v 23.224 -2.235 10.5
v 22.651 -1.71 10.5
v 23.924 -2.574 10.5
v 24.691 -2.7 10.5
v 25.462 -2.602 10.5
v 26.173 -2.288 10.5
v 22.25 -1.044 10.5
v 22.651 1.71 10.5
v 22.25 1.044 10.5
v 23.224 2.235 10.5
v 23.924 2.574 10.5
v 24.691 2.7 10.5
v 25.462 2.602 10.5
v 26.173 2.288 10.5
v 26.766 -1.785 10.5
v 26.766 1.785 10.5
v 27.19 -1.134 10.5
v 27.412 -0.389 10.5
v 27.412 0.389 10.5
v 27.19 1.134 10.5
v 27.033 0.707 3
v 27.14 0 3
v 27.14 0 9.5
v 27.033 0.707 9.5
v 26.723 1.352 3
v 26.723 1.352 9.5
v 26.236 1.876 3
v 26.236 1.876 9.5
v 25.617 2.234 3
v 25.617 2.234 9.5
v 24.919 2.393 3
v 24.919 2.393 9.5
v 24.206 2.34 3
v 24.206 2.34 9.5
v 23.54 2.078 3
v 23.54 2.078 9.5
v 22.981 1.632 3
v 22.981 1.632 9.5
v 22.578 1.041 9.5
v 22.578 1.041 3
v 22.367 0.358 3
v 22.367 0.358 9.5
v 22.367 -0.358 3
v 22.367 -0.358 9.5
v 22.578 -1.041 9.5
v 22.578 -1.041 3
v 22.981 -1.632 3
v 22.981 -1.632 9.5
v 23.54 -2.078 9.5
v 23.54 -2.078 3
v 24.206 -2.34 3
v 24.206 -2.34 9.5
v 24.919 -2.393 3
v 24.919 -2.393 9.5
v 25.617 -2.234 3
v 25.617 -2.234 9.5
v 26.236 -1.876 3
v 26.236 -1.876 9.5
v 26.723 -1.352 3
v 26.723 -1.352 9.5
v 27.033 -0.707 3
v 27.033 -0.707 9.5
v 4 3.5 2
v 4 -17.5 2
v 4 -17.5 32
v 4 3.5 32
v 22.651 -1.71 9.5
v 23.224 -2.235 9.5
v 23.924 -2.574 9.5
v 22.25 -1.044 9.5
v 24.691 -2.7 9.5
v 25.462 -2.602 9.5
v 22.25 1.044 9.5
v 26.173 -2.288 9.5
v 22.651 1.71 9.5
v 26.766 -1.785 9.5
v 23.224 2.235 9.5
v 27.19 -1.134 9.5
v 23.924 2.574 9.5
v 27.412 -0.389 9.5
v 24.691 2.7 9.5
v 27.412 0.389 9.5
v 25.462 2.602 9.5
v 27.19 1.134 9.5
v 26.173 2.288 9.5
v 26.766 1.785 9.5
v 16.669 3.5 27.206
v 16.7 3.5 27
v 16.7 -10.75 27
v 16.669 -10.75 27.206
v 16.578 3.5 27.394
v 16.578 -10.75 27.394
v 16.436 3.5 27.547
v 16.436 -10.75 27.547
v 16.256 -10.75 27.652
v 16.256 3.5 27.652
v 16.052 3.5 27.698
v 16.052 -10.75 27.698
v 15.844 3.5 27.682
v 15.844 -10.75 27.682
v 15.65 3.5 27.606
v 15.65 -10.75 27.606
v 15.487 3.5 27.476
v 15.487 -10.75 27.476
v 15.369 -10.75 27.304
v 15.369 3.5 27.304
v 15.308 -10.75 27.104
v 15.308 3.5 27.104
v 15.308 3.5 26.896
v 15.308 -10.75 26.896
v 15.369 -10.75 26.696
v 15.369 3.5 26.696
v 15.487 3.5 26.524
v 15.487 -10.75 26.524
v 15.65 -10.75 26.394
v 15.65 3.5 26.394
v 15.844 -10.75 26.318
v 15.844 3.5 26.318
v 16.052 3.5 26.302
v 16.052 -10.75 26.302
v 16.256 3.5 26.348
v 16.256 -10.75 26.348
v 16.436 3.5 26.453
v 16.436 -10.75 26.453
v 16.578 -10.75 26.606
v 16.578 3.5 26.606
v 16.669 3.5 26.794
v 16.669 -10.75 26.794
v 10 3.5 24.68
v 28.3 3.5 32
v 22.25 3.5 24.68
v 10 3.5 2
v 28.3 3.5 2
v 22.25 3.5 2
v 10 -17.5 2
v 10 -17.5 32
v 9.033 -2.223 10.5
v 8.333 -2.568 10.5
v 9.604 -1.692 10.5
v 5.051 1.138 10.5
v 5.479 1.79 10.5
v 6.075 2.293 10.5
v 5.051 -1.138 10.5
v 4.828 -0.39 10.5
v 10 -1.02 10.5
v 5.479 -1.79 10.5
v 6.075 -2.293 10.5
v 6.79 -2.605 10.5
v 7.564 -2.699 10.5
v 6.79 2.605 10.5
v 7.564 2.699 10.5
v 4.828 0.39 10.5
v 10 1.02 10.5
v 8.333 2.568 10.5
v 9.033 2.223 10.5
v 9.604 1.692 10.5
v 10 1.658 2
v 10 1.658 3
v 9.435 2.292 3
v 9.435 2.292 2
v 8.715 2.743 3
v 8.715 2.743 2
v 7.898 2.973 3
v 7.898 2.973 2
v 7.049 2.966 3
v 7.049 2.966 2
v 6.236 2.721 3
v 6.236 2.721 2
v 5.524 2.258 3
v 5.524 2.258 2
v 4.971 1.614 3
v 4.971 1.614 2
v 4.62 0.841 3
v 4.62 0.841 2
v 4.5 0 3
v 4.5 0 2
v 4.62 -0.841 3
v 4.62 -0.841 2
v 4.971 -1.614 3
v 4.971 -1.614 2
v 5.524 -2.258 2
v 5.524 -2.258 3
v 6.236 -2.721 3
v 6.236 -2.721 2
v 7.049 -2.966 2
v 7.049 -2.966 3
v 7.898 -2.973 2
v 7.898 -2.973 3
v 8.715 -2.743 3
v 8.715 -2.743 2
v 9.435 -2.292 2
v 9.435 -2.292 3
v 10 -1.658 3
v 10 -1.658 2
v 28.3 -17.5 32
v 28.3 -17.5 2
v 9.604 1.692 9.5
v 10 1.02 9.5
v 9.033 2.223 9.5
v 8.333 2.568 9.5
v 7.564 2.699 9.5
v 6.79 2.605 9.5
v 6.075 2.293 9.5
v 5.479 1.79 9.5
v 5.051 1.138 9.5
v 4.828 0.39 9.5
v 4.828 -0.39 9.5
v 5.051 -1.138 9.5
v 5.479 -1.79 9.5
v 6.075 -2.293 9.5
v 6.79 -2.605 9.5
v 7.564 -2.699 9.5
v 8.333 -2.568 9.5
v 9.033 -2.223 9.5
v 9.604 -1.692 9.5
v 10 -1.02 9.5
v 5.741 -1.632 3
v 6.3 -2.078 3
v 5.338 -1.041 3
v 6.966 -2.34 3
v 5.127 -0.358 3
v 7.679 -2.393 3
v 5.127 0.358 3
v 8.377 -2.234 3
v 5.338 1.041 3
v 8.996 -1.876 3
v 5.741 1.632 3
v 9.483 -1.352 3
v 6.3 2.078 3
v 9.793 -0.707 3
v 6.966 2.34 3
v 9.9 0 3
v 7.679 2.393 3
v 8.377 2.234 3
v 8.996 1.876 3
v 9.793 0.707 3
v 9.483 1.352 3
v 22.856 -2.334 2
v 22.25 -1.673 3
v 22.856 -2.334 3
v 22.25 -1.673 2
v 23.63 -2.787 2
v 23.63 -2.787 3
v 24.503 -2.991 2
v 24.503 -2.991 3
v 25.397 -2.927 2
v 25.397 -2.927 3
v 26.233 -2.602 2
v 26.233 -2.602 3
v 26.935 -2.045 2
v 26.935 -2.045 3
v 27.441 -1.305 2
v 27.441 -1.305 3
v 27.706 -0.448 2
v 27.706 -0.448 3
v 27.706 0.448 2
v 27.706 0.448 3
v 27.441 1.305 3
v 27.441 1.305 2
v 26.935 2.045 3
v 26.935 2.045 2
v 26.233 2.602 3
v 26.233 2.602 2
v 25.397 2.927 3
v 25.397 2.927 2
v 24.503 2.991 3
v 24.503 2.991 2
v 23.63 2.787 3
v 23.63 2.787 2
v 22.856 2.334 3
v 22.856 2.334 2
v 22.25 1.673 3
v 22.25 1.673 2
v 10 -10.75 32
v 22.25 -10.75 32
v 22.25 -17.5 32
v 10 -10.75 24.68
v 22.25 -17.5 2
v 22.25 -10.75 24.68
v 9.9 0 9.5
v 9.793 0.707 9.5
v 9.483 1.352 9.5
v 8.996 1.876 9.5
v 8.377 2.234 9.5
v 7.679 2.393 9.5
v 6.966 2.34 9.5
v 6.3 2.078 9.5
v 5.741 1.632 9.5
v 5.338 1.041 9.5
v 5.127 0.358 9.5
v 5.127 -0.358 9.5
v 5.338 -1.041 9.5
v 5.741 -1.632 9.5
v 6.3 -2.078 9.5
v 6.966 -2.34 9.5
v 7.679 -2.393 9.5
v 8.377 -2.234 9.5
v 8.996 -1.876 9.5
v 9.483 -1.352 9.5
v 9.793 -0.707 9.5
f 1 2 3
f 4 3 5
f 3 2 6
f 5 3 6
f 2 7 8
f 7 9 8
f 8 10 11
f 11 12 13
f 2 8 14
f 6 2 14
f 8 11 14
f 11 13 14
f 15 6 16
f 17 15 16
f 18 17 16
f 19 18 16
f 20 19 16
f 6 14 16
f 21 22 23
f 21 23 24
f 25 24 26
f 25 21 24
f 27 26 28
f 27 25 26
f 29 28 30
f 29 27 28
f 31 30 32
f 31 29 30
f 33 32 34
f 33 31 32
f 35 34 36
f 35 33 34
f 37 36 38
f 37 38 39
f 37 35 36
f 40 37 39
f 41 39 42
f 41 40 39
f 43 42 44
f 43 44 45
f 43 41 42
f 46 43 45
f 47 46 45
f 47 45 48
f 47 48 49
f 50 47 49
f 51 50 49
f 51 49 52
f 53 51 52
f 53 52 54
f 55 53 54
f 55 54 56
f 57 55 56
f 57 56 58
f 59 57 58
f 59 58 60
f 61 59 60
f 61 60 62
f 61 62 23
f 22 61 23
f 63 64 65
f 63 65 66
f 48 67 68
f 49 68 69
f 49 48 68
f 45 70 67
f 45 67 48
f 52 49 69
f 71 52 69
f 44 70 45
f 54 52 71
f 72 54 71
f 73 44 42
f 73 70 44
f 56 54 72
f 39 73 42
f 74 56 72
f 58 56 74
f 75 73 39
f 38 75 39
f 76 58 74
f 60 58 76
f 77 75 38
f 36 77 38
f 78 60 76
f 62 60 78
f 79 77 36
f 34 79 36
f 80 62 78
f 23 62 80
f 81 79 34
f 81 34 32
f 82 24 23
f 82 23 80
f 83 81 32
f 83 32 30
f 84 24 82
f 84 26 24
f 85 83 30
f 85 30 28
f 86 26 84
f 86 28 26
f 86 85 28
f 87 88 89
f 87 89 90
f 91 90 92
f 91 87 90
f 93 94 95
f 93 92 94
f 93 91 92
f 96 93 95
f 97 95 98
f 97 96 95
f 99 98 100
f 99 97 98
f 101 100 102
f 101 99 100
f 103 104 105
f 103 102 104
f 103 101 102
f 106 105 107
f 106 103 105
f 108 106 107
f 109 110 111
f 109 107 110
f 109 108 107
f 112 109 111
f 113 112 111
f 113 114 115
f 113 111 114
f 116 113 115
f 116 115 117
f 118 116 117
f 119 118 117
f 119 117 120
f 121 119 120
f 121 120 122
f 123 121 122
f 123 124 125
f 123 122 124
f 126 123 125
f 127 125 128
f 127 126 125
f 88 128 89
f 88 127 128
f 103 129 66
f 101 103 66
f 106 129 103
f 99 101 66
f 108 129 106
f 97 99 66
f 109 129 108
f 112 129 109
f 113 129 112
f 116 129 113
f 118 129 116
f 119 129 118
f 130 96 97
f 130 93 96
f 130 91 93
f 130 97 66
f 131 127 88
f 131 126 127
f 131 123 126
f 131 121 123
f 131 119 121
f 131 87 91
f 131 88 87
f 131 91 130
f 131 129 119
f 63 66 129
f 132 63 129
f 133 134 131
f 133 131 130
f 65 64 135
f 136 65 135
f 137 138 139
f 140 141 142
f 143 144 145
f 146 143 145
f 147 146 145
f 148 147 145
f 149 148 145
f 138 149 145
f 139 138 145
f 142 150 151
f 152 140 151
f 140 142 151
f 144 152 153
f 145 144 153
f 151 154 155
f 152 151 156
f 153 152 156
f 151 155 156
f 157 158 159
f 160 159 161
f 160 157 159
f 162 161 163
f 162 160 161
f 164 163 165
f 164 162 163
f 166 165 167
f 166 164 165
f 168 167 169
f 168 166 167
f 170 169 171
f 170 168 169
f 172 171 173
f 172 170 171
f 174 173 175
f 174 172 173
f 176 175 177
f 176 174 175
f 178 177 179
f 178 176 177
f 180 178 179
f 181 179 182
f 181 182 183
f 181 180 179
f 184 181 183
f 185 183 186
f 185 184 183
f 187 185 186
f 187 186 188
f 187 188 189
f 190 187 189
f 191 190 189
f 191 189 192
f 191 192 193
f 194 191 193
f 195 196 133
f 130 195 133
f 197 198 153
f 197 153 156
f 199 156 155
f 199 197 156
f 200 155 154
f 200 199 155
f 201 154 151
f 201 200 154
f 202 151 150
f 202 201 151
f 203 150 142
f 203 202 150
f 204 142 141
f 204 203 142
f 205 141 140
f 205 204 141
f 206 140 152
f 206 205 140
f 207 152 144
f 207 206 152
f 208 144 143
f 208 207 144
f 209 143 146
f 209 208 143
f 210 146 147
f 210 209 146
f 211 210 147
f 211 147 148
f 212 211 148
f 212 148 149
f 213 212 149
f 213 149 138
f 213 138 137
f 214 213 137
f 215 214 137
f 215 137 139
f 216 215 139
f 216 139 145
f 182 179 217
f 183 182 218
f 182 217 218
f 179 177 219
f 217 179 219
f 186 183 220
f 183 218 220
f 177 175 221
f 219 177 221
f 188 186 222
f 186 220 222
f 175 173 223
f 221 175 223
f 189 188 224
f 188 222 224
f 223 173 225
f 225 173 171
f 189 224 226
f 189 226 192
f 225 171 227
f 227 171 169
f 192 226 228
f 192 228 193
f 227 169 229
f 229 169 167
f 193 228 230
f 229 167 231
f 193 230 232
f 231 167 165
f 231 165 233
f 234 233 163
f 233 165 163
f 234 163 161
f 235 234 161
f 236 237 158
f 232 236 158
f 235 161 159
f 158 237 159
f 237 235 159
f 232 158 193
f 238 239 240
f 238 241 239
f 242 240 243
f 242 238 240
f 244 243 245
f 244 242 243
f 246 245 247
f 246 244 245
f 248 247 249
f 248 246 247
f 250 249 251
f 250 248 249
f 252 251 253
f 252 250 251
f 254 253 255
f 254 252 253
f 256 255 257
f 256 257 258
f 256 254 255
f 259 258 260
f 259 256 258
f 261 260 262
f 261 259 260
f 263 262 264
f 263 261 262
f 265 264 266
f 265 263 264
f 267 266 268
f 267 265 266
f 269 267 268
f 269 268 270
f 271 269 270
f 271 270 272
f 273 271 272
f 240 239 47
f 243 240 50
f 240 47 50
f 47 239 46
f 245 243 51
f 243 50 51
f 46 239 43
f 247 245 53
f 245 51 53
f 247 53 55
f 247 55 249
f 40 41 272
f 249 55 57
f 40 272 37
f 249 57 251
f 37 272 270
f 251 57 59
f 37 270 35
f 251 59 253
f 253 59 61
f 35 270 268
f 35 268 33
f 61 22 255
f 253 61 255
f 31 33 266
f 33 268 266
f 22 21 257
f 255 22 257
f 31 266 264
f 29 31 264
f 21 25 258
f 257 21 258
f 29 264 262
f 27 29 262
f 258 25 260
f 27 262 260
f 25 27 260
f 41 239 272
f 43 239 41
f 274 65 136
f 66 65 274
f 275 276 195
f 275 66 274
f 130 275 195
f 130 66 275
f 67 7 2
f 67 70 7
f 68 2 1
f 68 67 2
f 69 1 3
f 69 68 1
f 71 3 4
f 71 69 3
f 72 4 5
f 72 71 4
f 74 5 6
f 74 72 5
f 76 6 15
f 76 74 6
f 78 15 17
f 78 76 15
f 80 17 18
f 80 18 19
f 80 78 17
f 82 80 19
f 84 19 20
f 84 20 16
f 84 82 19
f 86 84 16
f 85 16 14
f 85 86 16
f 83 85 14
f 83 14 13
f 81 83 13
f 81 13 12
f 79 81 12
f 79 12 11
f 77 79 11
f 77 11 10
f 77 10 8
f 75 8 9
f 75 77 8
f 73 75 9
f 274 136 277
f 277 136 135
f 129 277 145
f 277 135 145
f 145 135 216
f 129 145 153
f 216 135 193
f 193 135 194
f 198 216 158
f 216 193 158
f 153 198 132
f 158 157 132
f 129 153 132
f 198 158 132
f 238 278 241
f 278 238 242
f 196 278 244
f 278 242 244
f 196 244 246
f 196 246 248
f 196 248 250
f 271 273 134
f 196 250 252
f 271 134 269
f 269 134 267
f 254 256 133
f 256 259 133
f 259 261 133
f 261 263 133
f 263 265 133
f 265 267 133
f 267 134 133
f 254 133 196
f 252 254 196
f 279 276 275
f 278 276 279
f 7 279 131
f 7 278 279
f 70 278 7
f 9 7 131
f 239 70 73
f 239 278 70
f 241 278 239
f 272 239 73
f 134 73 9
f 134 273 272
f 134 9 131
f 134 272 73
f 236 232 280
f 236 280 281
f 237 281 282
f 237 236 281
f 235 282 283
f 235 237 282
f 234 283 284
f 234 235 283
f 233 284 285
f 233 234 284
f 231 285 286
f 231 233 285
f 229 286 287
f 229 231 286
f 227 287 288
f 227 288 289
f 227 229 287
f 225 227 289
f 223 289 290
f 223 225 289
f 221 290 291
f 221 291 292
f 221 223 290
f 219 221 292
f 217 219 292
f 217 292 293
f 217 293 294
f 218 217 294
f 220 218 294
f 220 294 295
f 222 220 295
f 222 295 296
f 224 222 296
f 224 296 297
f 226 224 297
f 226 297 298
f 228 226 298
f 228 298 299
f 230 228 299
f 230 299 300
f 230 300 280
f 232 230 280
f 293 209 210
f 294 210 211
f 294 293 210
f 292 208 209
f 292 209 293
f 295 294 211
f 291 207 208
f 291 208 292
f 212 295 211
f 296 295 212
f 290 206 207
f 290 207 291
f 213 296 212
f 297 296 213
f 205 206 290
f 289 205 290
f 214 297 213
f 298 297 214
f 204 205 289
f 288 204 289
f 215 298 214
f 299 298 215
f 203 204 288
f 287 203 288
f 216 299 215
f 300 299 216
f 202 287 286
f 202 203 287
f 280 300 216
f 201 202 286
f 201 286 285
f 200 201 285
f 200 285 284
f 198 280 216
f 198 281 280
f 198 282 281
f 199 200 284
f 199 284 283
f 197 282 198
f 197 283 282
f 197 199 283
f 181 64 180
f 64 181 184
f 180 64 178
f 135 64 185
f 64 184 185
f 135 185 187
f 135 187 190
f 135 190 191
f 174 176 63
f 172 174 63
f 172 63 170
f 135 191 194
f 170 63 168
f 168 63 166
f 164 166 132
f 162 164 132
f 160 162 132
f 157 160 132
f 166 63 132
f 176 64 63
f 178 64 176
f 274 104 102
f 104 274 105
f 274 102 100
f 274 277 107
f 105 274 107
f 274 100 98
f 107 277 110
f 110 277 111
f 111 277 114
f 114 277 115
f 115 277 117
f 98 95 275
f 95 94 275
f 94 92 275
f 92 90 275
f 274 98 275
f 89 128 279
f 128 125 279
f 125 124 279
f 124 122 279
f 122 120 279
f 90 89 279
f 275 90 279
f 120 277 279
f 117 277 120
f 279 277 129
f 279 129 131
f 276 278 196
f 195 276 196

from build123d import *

# Parameters (mm, degrees)
CYLINDER008_R     = 3
CYLINDER008_DEPTH = 1.1
CYLINDER007_R     = 3
CYLINDER007_DEPTH = 1.1
CYLINDER004_R     = 2.4
CYLINDER004_DEPTH = 13
CYLINDER005_R     = 2.7
CYLINDER005_DEPTH = 1
CYLINDER006_R     = 2.7
CYLINDER006_DEPTH = 1
CYLINDER003_R     = 2.4
CYLINDER003_DEPTH = 13
CYLINDER002_R     = 0.7
CYLINDER002_DEPTH = 16
BOX007_W          = 12.25
BOX007_H          = 10
BOX007_DEPTH      = 10
BOX003_W          = 12.25
BOX003_H          = 23.78
BOX003_DEPTH      = 22.68
BOX008_W          = 24.3
BOX008_H          = 21
BOX008_DEPTH      = 30


with BuildPart() as cylinder008:
    # Cylinder008 → Cylinder008 (new body)
    with BuildSketch(Plane(origin=(-2.5, 17.5, -0.1), x_dir=(1, 0, 0), z_dir=(0, 0, 1))):
        Circle(CYLINDER008_R)
    extrude(amount=CYLINDER008_DEPTH)


with BuildPart() as fusion005:
    # Cylinder007 → Cylinder007 (new body)
    with BuildSketch(Plane(origin=(14.74, 17.5, -0.1), x_dir=(1, 0, 0), z_dir=(0, 0, 1))):
        Circle(CYLINDER007_R)
    extrude(amount=CYLINDER007_DEPTH)

    # Fusion005: union Cylinder008
    add(cylinder008.part)


with BuildPart() as cylinder004:
    # Cylinder004 → Cylinder004 (new body)
    with BuildSketch(Plane(origin=(14.74, 17.5, -6.5), x_dir=(1, 0, 0), z_dir=(0, 0, 1))):
        Circle(CYLINDER004_R)
    extrude(amount=CYLINDER004_DEPTH)


with BuildPart() as cylinder005:
    # Cylinder005 → Cylinder005 (new body)
    with BuildSketch(Plane(origin=(-2.5, 17.5, 6.5), x_dir=(1, 0, 0), z_dir=(0, 0, 1))):
        Circle(CYLINDER005_R)
    extrude(amount=CYLINDER005_DEPTH)


with BuildPart() as cylinder006:
    # Cylinder006 → Cylinder006 (new body)
    with BuildSketch(Plane(origin=(14.74, 17.5, 6.5), x_dir=(1, 0, 0), z_dir=(0, 0, 1))):
        Circle(CYLINDER006_R)
    extrude(amount=CYLINDER006_DEPTH)


with BuildPart() as fusion006:
    # Cylinder003 → Cylinder003 (new body)
    with BuildSketch(Plane(origin=(-2.5, 17.5, -6.5), x_dir=(1, 0, 0), z_dir=(0, 0, 1))):
        Circle(CYLINDER003_R)
    extrude(amount=CYLINDER003_DEPTH)

    # Fusion004: union Cylinder004, Cylinder005, Cylinder006
    add(cylinder004.part)
    add(cylinder005.part)
    add(cylinder006.part)


with BuildPart() as fusion006_1:
    # Fusion004 placement: moved
    add(fusion006.part.moved(Location((0, 0, 1))))

    # Fusion006: union Fusion005
    add(fusion005.part)


with BuildPart() as cylinder002:
    # Cylinder002 → Cylinder002 (new body)
    with BuildSketch(Plane(origin=(6, 22, 25), x_dir=(1, 0, 0), z_dir=(0, -1, 0))):
        Circle(CYLINDER002_R)
    extrude(amount=CYLINDER002_DEPTH)


with BuildPart() as cube004:
    # Box007 → Box007 (new body)
    with BuildSketch(Plane(origin=(0, -3.25, 22), x_dir=(1, 0, 0), z_dir=(0, 0, 1))):
        with Locations((6.125, 5)):
            Rectangle(BOX007_W, BOX007_H)
    extrude(amount=BOX007_DEPTH)


with BuildPart() as servo002:
    # Box003 → Box003 (new body)
    with BuildSketch(Plane(origin=(0, -1, 0), x_dir=(1, 0, 0), z_dir=(0, 0, 1))):
        with Locations((6.125, 11.89)):
            Rectangle(BOX003_W, BOX003_H)
    extrude(amount=BOX003_DEPTH)

    # Fusion002: union Cube004
    add(cube004.part)


with BuildPart() as fusion003:
    # Fusion003 base: copy of Cube004
    add(cube004.part)

    # Fusion003: union servo002
    add(servo002.part)


with BuildPart() as cut005:
    # Box008 → Box008 (new body)
    with BuildSketch(Plane(origin=(-6, 0, 0), x_dir=(1, 0, 0), z_dir=(0, 0, 1))):
        with Locations((12.15, 10.5)):
            Rectangle(BOX008_W, BOX008_H)
    extrude(amount=BOX008_DEPTH)

    # Cut002: cut Fusion003
    add(fusion003.part, mode=Mode.SUBTRACT)

    # Cut003: cut Cylinder002
    add(cylinder002.part, mode=Mode.SUBTRACT)

    # Cut005: cut Fusion006
    add(fusion006_1.part, mode=Mode.SUBTRACT)


with BuildPart() as cut005_1:
    # Cut005 placement: moved
    add(cut005.part.moved(Location((10, -17.5, 2))))


solid = cut005_1.part
